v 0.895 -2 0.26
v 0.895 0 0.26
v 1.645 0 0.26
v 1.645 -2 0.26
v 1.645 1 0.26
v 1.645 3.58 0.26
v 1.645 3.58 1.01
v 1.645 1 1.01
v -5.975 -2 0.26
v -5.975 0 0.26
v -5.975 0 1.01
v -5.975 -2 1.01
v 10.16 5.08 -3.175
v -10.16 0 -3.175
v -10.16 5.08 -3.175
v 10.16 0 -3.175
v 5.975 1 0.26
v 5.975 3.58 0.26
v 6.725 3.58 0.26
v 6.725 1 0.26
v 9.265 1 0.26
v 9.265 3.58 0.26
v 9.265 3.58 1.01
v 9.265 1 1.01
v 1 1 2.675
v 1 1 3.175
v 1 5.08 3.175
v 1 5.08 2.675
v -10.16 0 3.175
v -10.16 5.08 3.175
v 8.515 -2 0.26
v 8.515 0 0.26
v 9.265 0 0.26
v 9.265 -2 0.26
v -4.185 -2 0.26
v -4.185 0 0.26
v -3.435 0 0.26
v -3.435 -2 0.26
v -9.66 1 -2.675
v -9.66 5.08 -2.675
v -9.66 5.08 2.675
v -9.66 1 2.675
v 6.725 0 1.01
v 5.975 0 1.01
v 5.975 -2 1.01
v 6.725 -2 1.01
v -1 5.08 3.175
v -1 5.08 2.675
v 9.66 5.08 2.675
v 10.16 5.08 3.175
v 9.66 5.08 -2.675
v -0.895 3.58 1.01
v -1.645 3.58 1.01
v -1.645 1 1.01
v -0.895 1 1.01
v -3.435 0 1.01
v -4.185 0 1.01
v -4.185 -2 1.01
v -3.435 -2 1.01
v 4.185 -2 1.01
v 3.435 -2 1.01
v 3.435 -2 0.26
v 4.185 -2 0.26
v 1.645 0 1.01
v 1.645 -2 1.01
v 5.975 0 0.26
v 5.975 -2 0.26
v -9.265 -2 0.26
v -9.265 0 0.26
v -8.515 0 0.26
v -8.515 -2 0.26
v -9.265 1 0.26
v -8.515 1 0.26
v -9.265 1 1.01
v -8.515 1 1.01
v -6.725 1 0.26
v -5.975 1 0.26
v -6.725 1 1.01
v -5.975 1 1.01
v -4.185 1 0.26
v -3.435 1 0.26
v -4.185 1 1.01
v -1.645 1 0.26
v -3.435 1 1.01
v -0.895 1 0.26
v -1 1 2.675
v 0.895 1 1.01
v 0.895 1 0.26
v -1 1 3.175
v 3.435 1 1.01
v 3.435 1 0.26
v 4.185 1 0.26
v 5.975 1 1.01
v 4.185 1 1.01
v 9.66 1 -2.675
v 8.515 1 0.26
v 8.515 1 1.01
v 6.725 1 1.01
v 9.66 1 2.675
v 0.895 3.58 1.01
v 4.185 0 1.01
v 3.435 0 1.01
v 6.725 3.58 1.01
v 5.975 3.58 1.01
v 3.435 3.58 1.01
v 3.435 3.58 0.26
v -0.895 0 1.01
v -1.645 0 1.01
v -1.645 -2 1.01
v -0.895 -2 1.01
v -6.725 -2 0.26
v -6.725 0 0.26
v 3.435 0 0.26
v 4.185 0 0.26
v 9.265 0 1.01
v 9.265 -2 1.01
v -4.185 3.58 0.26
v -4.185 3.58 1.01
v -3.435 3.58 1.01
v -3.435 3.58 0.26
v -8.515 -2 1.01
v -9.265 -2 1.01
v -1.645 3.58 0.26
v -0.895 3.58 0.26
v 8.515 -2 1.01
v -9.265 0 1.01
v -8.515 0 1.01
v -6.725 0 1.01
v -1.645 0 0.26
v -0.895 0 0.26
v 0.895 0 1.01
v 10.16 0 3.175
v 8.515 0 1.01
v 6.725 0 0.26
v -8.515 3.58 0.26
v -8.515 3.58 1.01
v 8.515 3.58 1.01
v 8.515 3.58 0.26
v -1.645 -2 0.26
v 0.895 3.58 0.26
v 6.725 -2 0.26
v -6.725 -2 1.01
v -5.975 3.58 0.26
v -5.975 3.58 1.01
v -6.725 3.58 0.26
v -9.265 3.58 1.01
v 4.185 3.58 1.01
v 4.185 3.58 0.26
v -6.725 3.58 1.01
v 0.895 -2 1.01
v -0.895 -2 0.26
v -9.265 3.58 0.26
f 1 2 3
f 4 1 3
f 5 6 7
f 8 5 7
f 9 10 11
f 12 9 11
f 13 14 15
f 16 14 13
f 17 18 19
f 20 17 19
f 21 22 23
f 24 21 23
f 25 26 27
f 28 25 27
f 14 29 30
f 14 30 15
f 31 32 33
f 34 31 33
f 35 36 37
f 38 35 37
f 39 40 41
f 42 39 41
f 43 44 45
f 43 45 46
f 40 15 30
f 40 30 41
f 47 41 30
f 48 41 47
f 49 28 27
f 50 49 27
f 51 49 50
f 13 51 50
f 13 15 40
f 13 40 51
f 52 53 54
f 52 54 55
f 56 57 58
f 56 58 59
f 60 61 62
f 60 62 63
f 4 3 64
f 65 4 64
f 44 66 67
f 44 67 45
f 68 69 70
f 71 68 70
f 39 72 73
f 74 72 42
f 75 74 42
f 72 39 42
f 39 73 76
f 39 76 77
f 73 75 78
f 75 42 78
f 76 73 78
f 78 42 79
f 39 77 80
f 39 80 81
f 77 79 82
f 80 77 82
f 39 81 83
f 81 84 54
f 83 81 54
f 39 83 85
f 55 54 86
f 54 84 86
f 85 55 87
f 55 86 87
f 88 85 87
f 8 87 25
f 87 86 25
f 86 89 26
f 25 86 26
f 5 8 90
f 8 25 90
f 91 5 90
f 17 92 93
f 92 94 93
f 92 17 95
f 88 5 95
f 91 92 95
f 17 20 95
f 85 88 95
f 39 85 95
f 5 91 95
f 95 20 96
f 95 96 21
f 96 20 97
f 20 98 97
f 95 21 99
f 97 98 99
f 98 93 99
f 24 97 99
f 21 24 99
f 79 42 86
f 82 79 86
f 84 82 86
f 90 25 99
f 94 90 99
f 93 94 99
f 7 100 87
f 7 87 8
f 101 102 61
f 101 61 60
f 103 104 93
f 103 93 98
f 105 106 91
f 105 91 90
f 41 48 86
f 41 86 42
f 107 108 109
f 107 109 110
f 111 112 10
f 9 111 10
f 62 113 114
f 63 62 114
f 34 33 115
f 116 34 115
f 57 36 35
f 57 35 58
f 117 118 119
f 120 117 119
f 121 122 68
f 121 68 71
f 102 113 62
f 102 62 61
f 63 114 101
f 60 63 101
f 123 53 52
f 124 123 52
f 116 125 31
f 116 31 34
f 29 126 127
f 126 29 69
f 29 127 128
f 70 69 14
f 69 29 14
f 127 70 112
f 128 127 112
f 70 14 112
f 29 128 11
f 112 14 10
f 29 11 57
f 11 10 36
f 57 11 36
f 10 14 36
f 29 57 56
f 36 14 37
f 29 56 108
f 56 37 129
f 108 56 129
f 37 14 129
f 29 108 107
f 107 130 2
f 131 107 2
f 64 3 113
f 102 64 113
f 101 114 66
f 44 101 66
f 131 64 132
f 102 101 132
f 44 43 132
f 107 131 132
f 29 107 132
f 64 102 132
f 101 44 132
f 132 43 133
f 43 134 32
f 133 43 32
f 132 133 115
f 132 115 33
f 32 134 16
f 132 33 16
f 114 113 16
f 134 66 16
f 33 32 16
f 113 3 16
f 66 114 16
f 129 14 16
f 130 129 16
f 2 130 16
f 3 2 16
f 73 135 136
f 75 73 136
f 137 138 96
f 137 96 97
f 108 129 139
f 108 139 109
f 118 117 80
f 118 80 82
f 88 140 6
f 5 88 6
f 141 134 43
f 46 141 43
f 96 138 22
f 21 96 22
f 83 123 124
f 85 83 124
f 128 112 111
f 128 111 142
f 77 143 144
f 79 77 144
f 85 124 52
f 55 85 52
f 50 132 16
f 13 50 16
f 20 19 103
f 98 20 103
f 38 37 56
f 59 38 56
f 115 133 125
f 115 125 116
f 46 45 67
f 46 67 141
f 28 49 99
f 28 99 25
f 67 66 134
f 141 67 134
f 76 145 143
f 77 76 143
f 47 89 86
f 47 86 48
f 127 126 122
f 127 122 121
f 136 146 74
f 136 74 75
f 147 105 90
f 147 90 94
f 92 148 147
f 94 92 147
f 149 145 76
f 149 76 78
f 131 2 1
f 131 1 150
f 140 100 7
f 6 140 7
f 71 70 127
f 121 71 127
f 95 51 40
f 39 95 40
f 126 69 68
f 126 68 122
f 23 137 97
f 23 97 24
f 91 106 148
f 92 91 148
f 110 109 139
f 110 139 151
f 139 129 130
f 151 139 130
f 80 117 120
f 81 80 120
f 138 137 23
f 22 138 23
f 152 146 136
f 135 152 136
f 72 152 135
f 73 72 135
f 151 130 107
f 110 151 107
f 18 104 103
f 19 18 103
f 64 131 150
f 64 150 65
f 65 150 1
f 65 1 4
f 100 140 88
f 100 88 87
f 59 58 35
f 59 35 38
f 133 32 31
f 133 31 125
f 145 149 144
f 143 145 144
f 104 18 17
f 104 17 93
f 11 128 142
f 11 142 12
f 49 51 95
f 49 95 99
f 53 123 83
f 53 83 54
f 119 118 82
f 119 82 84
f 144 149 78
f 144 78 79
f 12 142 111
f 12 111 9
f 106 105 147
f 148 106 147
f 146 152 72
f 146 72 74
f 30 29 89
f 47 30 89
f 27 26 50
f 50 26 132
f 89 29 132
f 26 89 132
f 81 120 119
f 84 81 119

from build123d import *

# Parameters (mm, degrees)
SKETCH_1_W           = 20.32
SKETCH_1_H           = 6.35
EXTRUDE_1_DEPTH      = 5.08
SKETCH_2_W           = 19.32
SKETCH_2_H           = 5.35
CUT_EXTRUDE_1_DEPTH  = 4.08
SKETCH_3_W           = 2
SKETCH_3_H           = 4.08
CUT_EXTRUDE_2_DEPTH  = 1
EXTRUDE_2_DEPTH      = 2
EXTRUDE_2_DEPTH_BACK = 3.58
SKETCH_4_W           = 0.75
SKETCH_4_H           = 0.75


with BuildPart() as part:
    # 草图1 → 拉伸1 (new body)
    with BuildSketch(Plane(origin=(0, 0, 0), x_dir=(1, 0, 0), z_dir=(0, 1, 0))):
        Rectangle(SKETCH_1_W, SKETCH_1_H)
    extrude(amount=EXTRUDE_1_DEPTH)

    # 草图2 → 切除-拉伸1 (cut)
    with BuildSketch(Plane(origin=(0, 5.08, 0), x_dir=(-1, 0, 0), z_dir=(0, 1, 0))):
        Rectangle(SKETCH_2_W, SKETCH_2_H)
    extrude(amount=-CUT_EXTRUDE_1_DEPTH, mode=Mode.SUBTRACT)

    # 草图3 → 切除-拉伸2 (cut)
    with BuildSketch(Plane.XY.offset(3.175)):
        with Locations((0, 3.04)):
            Rectangle(SKETCH_3_W, SKETCH_3_H)
    extrude(amount=-CUT_EXTRUDE_2_DEPTH, mode=Mode.SUBTRACT)

    # 草图4 → 拉伸2 (add, two sides: drawn at the far end of the back side and taken through both)
    with BuildSketch(Plane.XZ.offset(-EXTRUDE_2_DEPTH_BACK)):
        with Locations((-1.27, 0.635)):
            Rectangle(SKETCH_4_W, SKETCH_4_H)
        with Locations((1.27, 0.635)):
            Rectangle(SKETCH_4_W, SKETCH_4_H)
        with Locations((3.81, 0.635)):
            Rectangle(SKETCH_4_W, SKETCH_4_H)
        with Locations((6.35, 0.635)):
            Rectangle(SKETCH_4_W, SKETCH_4_H)
        with Locations((-3.81, 0.635)):
            Rectangle(SKETCH_4_W, SKETCH_4_H)
        with Locations((-6.35, 0.635)):
            Rectangle(SKETCH_4_W, SKETCH_4_H)
        with Locations((-8.89, 0.635)):
            Rectangle(SKETCH_4_W, SKETCH_4_H)
        with Locations((8.89, 0.635)):
            Rectangle(SKETCH_4_W, SKETCH_4_H)
    extrude(amount=EXTRUDE_2_DEPTH + EXTRUDE_2_DEPTH_BACK)


solid = part.part
